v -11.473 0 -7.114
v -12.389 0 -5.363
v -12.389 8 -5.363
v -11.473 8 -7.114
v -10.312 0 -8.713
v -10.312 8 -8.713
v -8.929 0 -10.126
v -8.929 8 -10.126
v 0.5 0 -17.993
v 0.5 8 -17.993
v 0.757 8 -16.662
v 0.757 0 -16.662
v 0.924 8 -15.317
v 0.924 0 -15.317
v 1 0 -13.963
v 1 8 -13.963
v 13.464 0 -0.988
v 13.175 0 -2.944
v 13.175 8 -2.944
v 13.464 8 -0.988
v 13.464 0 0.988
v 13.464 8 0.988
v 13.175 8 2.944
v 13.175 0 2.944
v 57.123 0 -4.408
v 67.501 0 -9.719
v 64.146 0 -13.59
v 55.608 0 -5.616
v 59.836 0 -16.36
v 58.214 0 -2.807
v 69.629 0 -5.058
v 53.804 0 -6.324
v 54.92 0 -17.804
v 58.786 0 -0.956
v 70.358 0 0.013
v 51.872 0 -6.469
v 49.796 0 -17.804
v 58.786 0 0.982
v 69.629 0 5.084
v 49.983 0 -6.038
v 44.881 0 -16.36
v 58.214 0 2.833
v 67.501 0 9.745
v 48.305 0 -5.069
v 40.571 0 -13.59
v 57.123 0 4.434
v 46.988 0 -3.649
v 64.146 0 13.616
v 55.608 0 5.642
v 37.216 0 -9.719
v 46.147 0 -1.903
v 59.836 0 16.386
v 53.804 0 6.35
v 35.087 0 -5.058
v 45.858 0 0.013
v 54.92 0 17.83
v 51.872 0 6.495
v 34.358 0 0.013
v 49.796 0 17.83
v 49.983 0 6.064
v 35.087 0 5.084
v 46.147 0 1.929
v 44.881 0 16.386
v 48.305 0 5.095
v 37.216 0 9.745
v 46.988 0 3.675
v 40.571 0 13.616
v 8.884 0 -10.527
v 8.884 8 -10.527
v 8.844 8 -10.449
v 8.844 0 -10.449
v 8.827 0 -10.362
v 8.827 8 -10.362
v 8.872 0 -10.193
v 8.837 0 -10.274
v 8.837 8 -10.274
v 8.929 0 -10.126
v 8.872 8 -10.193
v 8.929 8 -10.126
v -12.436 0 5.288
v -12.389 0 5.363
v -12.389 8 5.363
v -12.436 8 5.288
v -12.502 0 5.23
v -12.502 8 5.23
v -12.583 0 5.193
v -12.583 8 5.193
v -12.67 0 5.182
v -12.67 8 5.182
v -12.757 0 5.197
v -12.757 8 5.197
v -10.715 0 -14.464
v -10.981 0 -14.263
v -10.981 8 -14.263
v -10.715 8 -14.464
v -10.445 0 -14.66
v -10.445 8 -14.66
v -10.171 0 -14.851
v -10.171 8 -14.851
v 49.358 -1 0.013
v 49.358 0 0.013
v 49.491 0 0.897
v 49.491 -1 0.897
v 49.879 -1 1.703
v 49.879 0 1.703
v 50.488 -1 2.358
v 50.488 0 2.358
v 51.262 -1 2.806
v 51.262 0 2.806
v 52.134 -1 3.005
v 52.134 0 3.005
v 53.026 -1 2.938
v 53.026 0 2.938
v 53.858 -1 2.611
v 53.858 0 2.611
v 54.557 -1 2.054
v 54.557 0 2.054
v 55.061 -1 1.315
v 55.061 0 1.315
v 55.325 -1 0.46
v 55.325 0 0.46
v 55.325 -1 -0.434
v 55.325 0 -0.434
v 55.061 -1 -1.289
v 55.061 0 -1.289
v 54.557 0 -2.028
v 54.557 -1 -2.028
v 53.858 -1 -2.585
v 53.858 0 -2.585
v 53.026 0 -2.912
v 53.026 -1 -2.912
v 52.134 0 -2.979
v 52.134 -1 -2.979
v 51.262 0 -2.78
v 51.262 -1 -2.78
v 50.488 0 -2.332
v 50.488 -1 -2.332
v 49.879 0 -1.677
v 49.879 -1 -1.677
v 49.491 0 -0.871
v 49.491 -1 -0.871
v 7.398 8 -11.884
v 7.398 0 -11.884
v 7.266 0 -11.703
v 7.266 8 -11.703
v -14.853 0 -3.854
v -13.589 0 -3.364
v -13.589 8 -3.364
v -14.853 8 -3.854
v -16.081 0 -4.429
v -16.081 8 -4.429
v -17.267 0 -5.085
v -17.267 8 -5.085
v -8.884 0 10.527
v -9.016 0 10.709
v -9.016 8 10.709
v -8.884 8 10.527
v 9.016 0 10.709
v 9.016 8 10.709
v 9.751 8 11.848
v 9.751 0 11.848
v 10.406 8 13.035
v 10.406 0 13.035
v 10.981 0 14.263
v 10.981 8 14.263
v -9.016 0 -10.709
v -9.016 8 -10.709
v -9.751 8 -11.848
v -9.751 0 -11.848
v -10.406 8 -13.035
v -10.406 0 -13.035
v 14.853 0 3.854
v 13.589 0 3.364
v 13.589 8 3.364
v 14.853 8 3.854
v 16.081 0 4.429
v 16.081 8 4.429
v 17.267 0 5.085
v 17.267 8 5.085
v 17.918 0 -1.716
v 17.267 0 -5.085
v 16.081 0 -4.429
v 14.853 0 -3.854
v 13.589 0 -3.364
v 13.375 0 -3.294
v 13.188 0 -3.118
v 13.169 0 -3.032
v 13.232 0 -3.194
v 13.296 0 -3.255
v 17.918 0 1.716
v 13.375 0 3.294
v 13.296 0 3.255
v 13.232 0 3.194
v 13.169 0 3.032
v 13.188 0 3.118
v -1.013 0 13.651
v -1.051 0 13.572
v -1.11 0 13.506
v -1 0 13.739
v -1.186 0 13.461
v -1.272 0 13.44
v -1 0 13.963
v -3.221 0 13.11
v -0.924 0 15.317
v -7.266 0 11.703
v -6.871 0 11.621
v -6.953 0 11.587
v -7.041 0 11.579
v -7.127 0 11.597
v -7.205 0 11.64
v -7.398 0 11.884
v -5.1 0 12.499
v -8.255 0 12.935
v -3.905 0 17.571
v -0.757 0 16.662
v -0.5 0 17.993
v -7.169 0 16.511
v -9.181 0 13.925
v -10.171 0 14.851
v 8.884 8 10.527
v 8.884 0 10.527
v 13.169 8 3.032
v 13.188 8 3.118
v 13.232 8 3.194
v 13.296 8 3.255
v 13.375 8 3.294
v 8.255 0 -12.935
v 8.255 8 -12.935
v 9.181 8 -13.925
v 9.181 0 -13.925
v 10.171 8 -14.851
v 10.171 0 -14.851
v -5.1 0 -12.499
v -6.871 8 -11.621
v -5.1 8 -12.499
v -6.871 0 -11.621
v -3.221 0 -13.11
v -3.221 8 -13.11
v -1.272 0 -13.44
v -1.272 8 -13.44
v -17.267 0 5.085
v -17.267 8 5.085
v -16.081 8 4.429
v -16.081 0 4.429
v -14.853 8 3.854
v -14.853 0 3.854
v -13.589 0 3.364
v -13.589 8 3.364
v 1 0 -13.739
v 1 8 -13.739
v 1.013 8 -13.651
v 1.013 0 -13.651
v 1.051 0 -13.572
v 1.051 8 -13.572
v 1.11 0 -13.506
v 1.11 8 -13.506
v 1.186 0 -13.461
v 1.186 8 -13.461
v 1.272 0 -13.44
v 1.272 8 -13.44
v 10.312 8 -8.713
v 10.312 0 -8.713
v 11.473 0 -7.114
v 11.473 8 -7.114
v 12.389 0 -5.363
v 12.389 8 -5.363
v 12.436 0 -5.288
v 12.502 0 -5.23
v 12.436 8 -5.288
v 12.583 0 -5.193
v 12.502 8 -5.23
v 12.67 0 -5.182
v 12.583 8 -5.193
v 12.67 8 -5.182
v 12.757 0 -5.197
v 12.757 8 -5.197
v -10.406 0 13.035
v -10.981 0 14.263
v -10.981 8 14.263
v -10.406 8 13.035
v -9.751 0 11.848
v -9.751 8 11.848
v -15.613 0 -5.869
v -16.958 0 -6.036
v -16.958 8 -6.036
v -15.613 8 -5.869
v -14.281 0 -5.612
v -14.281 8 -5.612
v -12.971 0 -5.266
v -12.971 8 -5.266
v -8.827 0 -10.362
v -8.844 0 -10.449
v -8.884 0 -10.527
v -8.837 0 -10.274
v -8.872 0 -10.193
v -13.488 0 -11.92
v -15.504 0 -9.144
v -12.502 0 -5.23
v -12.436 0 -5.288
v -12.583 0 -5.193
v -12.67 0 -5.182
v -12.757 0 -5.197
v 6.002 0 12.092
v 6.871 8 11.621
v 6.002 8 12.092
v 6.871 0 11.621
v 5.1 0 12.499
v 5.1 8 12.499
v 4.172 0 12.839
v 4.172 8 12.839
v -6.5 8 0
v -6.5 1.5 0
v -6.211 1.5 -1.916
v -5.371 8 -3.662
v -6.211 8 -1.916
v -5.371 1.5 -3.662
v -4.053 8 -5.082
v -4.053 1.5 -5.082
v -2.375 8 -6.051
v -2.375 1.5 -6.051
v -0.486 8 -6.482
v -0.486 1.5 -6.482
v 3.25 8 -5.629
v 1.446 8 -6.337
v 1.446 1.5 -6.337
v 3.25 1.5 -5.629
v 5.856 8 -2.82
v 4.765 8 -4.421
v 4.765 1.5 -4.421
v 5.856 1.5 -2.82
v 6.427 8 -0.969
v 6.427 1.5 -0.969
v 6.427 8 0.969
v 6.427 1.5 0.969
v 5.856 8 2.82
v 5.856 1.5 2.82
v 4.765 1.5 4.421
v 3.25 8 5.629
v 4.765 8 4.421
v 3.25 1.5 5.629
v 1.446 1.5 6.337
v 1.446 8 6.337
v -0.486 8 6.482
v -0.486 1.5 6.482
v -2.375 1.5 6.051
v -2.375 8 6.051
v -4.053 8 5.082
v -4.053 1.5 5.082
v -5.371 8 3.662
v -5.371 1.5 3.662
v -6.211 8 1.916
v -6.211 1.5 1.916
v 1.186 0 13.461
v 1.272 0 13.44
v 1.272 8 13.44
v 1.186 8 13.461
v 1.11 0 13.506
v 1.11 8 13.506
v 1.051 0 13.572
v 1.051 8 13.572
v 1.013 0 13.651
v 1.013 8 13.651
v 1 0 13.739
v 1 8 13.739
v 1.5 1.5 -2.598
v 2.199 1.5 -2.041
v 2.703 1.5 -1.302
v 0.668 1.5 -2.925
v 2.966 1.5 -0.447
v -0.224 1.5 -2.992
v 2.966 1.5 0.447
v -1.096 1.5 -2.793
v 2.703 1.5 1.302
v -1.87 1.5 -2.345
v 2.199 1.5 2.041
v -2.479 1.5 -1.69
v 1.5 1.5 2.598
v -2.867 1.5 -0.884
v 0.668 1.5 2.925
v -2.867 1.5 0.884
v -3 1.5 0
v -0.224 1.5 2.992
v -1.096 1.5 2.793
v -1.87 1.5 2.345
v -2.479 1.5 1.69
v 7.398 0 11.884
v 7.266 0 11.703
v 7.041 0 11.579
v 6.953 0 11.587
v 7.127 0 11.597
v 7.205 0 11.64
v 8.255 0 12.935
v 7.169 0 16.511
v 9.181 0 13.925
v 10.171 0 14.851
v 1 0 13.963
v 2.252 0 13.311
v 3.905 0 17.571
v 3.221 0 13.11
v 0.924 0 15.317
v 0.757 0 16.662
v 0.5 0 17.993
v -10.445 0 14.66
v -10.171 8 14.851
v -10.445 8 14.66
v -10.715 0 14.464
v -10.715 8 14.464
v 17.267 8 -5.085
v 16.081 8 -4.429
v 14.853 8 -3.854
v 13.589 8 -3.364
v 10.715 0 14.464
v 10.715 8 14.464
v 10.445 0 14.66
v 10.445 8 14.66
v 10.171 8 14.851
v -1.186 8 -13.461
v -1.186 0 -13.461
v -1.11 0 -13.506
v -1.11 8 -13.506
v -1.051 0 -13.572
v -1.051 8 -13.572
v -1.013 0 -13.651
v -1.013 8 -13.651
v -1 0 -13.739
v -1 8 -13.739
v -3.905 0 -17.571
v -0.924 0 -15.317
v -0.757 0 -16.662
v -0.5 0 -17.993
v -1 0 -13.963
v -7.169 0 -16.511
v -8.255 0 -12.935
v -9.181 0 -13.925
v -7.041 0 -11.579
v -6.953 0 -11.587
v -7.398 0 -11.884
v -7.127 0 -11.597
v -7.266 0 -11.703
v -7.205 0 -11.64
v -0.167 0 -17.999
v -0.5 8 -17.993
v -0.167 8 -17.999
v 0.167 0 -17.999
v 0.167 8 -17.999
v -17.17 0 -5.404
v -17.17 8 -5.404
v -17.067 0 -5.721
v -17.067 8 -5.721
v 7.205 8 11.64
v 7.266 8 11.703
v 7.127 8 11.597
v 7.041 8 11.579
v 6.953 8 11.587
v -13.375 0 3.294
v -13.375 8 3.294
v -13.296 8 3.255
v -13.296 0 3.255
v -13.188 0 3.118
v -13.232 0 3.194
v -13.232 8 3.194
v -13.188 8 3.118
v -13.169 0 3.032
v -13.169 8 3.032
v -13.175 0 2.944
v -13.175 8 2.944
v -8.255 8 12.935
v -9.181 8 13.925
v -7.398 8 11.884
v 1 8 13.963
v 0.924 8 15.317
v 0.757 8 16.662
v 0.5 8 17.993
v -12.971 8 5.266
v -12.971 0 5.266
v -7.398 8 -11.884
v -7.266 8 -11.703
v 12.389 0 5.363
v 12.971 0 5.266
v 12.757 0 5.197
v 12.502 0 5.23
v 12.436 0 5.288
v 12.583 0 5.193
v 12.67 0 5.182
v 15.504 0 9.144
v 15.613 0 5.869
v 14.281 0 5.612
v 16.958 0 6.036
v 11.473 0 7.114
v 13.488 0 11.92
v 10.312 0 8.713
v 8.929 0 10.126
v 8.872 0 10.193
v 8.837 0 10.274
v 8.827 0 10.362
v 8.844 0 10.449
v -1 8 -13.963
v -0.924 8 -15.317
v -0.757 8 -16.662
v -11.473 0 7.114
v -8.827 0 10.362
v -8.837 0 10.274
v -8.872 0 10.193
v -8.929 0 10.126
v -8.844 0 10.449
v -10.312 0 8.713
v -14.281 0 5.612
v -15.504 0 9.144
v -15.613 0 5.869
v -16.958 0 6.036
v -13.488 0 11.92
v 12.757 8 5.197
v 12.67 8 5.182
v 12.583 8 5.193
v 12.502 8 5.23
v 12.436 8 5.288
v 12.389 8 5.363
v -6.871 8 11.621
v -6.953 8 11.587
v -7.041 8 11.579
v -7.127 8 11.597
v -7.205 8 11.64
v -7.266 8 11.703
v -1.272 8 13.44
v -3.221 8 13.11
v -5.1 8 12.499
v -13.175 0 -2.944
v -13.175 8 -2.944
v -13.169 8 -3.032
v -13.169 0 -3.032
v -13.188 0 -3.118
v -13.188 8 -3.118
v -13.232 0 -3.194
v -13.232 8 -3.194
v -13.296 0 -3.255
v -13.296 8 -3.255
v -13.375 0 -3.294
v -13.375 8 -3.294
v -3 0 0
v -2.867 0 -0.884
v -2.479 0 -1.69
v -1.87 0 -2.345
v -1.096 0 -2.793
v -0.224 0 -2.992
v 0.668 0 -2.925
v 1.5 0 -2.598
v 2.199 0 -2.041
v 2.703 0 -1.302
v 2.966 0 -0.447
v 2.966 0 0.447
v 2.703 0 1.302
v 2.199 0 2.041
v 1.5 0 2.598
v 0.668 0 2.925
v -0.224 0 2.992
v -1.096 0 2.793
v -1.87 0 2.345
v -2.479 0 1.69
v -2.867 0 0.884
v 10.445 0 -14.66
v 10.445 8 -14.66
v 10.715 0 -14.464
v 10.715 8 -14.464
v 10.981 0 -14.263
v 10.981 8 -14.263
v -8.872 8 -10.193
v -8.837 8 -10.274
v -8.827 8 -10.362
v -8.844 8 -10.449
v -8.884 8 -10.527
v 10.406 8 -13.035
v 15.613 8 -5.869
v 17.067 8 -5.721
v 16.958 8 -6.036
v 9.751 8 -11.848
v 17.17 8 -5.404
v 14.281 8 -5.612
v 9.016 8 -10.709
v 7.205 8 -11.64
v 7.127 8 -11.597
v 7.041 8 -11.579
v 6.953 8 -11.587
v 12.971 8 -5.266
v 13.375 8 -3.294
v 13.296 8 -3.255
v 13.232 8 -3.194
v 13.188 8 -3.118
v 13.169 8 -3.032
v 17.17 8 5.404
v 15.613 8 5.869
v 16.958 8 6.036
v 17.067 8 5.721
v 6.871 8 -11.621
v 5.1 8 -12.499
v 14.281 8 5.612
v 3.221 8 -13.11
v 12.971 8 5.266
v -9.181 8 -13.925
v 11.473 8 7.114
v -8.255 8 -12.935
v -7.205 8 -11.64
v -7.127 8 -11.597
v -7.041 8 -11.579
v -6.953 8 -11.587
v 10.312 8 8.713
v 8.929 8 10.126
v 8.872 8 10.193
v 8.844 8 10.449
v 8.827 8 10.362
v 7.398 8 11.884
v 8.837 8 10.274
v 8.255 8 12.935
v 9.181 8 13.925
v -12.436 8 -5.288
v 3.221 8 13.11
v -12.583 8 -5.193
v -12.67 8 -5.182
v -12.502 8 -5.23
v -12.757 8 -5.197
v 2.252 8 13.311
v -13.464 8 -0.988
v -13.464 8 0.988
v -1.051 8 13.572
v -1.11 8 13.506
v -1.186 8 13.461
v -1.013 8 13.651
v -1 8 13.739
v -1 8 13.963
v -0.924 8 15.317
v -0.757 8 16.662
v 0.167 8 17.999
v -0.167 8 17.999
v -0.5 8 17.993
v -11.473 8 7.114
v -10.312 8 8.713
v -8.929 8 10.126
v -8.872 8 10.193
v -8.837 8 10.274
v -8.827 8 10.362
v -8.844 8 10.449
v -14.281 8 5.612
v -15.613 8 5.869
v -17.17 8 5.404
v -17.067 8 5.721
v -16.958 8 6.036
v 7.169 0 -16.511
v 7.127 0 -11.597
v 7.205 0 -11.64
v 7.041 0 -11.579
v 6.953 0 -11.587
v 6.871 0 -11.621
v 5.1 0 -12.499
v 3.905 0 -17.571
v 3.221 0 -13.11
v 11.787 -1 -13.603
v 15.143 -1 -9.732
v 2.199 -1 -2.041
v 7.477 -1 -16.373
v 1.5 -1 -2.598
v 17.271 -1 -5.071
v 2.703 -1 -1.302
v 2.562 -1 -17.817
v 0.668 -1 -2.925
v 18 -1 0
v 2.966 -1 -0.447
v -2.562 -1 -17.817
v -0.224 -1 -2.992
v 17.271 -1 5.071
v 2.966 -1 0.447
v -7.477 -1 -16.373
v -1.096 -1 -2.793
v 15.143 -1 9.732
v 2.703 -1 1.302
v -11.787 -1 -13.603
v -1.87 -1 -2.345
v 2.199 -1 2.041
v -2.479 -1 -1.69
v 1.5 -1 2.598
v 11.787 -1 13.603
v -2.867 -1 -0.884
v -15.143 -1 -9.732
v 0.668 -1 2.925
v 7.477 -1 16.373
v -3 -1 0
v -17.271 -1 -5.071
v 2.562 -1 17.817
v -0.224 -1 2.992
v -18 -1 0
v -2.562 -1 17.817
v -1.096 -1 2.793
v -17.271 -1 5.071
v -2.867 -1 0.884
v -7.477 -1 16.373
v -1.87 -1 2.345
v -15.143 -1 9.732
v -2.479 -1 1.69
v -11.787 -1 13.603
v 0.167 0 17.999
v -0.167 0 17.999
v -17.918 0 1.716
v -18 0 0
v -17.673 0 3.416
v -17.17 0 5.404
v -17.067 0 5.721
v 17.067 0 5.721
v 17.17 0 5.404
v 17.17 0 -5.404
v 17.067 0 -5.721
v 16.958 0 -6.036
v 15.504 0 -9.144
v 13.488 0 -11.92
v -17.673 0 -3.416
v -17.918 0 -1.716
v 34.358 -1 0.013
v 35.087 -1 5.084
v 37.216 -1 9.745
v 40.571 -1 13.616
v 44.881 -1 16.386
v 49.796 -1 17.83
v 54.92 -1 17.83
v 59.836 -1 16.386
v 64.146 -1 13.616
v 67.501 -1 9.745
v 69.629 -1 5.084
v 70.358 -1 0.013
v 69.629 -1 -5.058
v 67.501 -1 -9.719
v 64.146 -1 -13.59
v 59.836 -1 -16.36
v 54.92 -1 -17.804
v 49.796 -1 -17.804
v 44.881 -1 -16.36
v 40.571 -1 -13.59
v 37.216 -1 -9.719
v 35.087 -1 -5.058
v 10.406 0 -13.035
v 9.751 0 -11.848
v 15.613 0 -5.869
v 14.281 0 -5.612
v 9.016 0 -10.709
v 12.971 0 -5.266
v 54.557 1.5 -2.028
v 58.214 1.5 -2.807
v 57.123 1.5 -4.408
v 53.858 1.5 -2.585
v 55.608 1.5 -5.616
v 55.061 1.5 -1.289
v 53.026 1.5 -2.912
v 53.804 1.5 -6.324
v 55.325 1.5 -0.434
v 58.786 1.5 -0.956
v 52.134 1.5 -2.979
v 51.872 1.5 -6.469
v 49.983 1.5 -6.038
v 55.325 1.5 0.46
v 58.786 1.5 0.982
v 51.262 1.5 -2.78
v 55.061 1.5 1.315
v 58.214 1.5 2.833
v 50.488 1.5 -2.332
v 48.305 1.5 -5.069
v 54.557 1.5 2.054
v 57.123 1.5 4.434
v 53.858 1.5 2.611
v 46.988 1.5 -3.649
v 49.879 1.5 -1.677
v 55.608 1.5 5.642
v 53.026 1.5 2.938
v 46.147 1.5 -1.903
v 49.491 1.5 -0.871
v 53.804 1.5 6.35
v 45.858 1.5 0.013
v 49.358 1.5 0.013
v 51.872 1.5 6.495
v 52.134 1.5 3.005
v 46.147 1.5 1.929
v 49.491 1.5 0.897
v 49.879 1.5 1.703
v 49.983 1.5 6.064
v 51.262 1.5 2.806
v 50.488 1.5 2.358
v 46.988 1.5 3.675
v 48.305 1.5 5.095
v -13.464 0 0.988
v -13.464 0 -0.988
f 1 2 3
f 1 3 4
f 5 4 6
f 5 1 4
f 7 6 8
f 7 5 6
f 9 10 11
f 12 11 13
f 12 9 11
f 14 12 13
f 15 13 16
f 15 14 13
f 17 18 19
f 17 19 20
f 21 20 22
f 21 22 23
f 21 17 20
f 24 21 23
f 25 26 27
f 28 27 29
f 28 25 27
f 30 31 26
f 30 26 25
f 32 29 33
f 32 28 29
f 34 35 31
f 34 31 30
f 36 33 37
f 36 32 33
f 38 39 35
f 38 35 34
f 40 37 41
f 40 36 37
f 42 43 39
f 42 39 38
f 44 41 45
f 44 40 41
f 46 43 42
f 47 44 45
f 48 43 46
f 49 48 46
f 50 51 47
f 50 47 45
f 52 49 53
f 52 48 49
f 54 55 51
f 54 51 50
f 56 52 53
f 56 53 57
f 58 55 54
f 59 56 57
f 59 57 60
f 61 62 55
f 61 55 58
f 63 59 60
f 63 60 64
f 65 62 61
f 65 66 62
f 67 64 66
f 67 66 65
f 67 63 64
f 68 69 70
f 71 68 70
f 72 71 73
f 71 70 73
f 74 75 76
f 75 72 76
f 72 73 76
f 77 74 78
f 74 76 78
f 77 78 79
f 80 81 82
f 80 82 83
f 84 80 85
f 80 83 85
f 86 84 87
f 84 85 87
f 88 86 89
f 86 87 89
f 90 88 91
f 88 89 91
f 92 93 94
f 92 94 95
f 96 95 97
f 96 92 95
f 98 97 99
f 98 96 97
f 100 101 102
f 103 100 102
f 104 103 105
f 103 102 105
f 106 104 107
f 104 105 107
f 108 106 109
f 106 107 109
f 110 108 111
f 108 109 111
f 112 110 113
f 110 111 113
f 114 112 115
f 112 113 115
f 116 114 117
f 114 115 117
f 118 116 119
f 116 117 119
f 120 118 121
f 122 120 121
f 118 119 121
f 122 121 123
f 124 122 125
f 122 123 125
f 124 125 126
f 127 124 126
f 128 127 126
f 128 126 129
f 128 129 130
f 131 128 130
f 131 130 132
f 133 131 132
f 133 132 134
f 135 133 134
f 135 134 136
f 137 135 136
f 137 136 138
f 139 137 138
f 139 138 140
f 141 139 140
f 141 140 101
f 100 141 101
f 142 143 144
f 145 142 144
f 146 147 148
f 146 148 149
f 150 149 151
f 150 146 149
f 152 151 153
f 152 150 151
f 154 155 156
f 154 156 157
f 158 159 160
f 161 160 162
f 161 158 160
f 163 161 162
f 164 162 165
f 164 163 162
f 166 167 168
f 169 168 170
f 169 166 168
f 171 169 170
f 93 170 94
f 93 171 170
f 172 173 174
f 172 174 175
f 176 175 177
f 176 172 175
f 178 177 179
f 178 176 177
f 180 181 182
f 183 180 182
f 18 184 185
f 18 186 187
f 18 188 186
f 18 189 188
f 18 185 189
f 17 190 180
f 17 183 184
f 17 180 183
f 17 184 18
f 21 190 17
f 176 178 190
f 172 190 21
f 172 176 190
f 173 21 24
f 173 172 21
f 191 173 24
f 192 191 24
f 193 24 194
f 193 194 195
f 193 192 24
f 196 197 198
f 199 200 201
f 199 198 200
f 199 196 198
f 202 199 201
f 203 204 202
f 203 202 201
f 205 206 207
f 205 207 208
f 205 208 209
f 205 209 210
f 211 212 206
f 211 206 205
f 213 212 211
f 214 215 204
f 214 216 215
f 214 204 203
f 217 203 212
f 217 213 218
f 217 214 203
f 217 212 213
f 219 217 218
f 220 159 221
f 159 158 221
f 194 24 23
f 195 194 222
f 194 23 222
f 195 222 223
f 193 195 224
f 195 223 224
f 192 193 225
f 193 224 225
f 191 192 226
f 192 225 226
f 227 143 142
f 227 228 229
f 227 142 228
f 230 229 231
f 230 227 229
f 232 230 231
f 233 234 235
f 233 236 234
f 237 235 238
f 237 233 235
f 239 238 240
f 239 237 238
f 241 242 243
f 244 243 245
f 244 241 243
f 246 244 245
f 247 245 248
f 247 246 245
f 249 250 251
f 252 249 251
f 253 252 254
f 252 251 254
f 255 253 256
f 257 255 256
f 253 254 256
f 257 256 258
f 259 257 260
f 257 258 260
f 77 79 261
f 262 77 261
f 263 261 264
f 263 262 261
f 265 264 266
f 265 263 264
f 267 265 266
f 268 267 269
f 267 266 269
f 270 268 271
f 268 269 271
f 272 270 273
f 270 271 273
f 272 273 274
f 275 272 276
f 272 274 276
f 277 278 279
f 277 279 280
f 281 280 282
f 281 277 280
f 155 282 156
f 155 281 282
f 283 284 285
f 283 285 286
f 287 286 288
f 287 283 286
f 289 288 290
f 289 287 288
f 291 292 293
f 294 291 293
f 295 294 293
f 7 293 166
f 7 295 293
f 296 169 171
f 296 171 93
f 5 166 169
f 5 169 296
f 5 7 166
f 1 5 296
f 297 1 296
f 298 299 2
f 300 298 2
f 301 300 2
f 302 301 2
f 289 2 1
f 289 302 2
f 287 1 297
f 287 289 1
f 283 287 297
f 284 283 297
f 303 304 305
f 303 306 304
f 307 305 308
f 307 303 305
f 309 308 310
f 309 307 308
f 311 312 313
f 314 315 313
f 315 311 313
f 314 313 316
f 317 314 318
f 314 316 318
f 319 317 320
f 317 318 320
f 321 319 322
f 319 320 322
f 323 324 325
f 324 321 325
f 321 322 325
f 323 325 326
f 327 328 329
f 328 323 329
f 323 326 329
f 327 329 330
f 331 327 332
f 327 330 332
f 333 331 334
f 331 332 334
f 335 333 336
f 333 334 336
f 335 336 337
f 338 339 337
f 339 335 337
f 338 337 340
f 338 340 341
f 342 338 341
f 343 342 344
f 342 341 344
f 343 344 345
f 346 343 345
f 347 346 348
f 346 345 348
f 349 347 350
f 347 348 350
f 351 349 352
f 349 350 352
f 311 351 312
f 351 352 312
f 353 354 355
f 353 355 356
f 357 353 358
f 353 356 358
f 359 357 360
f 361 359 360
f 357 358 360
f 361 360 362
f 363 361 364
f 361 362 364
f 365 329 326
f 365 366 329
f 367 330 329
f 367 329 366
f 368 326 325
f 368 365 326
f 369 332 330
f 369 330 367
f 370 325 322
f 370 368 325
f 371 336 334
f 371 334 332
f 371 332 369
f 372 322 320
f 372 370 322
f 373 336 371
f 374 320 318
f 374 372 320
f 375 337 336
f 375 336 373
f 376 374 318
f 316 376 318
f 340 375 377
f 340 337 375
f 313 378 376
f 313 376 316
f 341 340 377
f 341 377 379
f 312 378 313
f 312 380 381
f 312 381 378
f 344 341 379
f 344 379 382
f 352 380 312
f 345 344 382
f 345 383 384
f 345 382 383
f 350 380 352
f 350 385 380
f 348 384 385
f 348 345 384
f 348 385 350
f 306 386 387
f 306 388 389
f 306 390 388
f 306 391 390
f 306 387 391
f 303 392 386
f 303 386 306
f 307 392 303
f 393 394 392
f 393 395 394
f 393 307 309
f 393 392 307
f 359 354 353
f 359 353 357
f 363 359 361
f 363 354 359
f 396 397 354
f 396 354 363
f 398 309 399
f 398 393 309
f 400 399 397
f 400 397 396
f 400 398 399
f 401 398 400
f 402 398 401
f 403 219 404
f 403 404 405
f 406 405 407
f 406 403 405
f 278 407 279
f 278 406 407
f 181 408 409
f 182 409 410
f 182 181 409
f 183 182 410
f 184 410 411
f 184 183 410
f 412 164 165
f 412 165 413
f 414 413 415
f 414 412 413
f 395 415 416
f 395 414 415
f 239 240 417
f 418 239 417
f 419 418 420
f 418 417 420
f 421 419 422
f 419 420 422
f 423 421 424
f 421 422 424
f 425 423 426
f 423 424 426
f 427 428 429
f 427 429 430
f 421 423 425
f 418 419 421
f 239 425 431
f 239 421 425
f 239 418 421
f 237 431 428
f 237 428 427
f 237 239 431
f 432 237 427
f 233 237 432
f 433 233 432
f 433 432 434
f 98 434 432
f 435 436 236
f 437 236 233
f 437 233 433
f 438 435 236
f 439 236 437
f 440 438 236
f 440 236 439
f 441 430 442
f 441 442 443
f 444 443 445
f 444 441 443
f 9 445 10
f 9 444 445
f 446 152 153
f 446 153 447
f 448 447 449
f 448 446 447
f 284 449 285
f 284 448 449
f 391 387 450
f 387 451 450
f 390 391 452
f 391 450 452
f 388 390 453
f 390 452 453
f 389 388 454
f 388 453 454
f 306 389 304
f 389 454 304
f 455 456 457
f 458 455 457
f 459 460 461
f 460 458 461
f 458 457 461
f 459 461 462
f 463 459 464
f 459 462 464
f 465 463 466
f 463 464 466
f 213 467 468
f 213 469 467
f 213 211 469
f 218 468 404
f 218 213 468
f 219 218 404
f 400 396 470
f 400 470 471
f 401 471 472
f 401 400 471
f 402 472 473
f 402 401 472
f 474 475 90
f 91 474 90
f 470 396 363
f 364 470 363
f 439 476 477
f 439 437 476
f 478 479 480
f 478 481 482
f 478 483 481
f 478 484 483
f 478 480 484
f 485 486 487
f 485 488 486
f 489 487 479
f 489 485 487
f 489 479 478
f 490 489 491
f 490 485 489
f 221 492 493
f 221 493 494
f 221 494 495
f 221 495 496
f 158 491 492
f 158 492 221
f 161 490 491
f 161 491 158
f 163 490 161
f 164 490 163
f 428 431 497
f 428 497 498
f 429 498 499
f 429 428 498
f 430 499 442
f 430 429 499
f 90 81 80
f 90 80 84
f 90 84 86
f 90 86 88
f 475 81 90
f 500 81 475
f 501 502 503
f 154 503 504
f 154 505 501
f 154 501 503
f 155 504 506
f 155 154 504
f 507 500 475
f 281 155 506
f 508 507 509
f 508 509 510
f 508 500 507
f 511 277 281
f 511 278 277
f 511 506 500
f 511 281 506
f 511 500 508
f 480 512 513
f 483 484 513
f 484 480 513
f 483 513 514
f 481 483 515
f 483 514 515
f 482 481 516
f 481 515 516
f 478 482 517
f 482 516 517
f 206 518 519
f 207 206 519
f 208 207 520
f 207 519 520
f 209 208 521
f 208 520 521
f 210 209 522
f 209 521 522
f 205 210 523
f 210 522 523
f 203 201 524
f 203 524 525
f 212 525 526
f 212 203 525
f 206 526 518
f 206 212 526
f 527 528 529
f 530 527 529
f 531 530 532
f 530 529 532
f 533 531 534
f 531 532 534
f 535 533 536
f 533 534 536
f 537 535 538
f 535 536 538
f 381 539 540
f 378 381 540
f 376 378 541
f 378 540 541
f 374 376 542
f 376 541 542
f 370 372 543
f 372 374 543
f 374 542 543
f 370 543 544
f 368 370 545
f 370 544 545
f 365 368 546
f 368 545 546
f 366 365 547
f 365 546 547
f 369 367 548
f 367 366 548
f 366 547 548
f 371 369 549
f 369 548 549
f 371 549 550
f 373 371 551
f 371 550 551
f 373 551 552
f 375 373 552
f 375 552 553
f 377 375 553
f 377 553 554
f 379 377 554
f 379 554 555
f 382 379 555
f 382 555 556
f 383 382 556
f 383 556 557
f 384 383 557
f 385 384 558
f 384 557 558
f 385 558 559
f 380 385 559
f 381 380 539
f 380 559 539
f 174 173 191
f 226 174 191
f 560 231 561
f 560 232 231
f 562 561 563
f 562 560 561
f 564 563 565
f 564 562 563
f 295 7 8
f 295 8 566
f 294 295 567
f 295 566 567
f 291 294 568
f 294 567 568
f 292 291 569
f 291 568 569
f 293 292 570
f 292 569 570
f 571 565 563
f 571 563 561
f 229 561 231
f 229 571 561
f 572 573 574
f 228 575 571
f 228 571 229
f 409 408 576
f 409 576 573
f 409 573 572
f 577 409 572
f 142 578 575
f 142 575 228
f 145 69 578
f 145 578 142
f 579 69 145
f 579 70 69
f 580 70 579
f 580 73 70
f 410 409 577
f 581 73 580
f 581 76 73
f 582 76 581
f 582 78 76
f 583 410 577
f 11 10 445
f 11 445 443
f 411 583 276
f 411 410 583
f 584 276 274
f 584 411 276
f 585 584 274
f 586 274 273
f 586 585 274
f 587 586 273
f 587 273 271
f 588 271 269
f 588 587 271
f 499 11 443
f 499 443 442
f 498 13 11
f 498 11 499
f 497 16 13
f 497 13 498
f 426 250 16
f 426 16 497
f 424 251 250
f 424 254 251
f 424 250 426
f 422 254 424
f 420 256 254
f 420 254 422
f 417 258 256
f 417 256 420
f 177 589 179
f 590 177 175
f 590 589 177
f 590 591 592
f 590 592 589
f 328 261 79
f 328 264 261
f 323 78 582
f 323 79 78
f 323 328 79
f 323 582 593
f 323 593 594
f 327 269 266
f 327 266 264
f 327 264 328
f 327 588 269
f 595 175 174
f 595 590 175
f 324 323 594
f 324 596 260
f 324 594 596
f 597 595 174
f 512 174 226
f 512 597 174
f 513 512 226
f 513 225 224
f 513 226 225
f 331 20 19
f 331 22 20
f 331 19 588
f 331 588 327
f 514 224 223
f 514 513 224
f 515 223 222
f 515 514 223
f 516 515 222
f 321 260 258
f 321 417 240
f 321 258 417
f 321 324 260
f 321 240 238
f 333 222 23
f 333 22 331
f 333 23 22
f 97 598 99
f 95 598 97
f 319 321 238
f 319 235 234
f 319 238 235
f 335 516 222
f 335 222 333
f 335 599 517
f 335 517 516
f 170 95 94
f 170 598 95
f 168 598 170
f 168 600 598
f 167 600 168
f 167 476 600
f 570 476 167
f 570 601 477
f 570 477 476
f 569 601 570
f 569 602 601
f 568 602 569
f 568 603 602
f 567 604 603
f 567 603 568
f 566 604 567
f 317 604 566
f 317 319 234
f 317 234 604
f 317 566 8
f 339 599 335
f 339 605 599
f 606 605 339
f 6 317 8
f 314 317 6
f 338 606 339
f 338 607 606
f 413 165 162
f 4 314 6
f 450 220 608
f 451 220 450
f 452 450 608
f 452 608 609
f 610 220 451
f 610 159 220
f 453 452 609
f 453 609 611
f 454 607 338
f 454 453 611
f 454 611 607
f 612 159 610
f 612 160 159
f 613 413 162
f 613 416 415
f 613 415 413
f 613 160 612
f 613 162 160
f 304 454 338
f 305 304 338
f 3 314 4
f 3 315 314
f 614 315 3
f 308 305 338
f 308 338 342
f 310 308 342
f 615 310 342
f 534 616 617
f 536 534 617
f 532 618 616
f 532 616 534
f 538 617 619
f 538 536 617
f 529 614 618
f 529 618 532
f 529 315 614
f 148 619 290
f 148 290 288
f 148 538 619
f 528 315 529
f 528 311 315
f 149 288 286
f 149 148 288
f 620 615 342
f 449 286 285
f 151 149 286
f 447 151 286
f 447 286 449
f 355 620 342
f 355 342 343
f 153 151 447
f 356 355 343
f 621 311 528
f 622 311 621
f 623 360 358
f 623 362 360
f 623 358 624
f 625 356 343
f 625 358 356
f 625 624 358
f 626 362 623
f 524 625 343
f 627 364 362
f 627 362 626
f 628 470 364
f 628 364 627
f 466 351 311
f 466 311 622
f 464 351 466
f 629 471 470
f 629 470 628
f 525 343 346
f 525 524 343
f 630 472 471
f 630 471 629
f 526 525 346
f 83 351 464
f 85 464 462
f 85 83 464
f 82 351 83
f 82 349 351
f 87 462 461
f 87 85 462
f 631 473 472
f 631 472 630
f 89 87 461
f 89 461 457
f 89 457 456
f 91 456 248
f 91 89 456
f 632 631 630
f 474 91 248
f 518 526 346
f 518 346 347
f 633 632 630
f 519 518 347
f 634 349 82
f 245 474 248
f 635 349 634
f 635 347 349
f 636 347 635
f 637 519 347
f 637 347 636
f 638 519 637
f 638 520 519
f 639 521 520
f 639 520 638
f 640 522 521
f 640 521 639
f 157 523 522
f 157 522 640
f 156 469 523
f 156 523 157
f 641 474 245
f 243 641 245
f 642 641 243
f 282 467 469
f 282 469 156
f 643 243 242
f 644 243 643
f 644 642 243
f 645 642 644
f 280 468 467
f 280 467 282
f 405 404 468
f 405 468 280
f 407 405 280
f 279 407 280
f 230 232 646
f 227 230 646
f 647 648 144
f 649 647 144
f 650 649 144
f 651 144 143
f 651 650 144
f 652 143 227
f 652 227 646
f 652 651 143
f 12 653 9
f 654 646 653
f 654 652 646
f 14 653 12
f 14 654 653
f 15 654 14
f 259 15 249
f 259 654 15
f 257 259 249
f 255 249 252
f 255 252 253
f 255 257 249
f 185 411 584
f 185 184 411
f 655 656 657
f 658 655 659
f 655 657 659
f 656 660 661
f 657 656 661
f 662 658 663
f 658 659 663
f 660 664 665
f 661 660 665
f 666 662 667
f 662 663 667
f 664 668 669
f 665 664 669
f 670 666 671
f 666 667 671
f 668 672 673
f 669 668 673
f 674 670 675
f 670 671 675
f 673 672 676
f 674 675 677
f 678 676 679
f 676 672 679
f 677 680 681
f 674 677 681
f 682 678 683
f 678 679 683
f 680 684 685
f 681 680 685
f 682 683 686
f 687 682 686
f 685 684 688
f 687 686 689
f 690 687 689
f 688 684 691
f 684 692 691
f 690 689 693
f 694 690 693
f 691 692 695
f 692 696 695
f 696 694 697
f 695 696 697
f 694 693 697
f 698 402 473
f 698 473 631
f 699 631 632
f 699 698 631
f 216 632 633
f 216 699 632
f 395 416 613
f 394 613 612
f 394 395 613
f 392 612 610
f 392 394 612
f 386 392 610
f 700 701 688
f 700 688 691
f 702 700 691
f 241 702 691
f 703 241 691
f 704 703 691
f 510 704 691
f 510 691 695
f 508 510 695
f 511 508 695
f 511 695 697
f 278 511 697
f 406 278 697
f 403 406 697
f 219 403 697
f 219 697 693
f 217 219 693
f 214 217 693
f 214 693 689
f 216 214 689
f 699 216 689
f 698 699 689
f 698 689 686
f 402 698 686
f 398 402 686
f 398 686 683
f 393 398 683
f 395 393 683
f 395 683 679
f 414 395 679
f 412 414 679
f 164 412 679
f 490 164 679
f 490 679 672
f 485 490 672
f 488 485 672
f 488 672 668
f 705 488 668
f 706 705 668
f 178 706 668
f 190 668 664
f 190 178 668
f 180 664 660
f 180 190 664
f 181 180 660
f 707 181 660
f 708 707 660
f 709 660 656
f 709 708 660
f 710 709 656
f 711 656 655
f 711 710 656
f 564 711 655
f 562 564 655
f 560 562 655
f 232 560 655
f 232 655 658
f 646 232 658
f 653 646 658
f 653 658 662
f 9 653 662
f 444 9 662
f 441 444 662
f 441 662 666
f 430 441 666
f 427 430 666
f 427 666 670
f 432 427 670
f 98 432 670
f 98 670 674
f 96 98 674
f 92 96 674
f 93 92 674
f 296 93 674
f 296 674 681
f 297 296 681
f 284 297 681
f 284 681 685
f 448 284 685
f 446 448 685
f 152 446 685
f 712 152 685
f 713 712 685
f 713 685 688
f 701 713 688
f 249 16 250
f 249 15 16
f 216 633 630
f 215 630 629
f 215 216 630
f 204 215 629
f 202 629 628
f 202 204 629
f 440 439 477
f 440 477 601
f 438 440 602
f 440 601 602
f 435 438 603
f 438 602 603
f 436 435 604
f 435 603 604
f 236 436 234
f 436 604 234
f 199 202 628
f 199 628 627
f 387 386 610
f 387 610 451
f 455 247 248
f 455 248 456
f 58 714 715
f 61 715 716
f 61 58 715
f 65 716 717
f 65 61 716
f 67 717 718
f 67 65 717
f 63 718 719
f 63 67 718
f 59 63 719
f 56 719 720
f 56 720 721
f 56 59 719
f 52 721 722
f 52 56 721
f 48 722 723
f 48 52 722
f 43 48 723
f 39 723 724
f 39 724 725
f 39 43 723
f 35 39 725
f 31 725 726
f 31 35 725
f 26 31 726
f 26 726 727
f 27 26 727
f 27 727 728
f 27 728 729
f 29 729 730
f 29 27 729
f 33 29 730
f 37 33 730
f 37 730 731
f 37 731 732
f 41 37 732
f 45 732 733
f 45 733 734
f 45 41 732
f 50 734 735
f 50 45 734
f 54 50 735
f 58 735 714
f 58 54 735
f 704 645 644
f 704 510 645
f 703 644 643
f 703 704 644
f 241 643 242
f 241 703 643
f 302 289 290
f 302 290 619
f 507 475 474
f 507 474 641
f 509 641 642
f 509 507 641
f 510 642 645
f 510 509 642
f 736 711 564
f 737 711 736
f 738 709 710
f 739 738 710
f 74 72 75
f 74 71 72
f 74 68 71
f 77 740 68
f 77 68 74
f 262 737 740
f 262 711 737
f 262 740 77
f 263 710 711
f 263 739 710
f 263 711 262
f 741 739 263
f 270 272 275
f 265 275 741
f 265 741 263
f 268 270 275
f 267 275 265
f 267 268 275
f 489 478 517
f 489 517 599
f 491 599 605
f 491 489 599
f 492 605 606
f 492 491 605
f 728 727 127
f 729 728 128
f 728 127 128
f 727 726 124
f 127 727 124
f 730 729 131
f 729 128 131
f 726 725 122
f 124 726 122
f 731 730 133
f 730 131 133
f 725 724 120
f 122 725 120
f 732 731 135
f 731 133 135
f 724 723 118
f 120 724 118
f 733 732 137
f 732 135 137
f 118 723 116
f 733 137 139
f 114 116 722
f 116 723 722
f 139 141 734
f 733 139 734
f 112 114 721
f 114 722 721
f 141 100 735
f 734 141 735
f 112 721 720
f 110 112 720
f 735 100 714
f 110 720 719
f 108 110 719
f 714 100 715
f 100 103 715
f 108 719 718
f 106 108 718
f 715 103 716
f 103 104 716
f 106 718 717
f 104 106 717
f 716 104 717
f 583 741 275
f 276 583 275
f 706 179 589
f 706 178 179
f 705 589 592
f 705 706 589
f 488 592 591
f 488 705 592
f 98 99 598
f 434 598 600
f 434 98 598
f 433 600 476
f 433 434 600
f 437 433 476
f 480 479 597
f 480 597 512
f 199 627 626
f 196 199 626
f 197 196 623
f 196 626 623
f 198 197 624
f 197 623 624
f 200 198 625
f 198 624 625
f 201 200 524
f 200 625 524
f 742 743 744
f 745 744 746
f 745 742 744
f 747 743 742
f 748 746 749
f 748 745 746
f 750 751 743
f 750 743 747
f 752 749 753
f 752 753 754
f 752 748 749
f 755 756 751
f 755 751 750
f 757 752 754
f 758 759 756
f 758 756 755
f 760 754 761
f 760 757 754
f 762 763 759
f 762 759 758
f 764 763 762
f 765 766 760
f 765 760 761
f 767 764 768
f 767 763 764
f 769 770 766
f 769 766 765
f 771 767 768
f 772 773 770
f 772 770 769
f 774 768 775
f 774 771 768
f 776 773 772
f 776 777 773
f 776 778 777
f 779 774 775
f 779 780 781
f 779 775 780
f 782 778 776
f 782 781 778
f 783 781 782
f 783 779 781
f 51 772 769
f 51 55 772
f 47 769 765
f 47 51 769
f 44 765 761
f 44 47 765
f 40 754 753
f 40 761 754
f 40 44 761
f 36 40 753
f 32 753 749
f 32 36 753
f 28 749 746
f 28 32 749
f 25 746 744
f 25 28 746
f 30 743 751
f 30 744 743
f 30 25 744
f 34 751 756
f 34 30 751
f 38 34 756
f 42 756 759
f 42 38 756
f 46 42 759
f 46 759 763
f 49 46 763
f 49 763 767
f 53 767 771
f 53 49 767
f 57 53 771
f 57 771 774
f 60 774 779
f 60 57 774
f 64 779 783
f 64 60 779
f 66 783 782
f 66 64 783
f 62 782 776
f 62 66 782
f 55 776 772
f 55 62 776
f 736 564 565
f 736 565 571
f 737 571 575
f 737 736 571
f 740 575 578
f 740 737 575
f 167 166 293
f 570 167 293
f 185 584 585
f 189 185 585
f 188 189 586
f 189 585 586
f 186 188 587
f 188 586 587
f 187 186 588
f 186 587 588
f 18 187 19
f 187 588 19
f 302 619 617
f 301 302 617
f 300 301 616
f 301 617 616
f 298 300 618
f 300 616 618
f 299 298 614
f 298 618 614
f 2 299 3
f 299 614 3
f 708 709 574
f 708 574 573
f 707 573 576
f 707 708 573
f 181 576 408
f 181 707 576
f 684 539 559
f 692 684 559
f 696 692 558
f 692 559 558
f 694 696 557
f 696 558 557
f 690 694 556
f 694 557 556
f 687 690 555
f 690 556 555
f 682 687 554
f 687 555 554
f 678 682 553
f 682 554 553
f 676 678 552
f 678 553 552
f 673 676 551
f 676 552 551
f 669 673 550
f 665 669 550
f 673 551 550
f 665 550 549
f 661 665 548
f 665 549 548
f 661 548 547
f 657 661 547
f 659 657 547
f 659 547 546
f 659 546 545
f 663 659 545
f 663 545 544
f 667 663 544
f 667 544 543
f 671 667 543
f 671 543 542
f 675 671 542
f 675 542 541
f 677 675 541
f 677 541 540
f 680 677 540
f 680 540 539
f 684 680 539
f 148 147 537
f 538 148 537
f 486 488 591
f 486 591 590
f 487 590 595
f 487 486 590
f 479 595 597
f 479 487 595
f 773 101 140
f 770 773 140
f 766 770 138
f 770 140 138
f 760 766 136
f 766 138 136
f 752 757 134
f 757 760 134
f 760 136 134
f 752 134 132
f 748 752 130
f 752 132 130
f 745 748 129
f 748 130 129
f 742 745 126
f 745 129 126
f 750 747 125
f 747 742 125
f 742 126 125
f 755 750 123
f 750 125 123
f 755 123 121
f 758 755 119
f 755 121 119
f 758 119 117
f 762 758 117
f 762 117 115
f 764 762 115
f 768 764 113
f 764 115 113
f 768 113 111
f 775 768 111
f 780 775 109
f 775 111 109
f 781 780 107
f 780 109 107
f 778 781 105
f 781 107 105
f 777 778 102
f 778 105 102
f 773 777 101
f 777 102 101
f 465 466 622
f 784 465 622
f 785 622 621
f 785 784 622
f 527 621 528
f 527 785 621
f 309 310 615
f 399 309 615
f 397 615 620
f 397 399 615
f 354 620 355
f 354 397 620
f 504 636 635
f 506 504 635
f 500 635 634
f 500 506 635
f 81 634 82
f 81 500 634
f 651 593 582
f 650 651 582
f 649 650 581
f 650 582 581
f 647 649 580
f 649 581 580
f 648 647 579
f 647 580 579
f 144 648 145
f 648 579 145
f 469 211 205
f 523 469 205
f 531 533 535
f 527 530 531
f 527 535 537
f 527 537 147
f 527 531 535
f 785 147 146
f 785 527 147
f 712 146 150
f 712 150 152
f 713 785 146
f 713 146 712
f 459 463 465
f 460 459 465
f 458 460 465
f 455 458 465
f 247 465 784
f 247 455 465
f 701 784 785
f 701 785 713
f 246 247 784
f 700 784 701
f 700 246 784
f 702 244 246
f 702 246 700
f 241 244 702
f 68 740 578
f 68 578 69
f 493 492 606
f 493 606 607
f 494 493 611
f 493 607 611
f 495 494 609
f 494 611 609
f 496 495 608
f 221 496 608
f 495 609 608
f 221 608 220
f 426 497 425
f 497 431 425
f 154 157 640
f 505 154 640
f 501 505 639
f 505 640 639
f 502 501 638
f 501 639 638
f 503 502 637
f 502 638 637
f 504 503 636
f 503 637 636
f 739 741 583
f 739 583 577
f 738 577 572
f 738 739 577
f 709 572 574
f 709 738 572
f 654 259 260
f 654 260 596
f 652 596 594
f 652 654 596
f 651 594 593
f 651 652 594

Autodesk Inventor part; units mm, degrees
ref_plane "YZ Plane" through (0, 0, 0) normal (1, 0, 0) x (0, 1, 0)
ref_plane "XZ Plane" through (0, 0, 0) normal (0, 1, 0) x (-1, 0, 0)
ref_plane "XY Plane" through (0, 0, 0) normal (0, 0, 1) x (1, 0, 0)
sketch "Sketch1" plane through (0, 0, 0) normal (0, 1, 0) x (-1, 0, 0)
  circle A0 centre (0, 0) radius 18
  circle A1 centre (0, 0) radius 16.7855
  circle A2 centre (0, 0) radius 13.999
  line L0 (0, -13.999) -> (0, 0) construction
  line L1 (0, 0) -> (13.999, 0) construction
  circle A3 centre (0, 0) radius 13.5
  arc A4 (0.5001, -17.9931) -> (1, -13.9632) centre (-19.096, -13.5161) ccw
  arc A5 (-1, -13.9632) -> (-0.5001, -17.9931) centre (19.096, -13.5161) ccw
  line L2 (-1, -13.9632) -> (-1, -13.4629)
  line L3 (1, -13.9632) -> (1, -13.4629)
  circle A6 centre (0, 0) radius 3
  circle A7 centre (0, 0) radius 6.5
  circle A8 centre (-52.3581, 0.013) radius 18
  circle A9 centre (-52.3581, 0.013) radius 16.7855
  circle A10 centre (-52.3581, 0.013) radius 13.999
  line L4 (-52.3581, -13.986) -> (-52.3581, 0.013) construction
  line L5 (-52.3581, 0.013) -> (-38.3591, 0.013) construction
  circle A11 centre (-52.3581, 0.013) radius 13.5
  arc A12 (-51.858, -17.98) -> (-51.3581, -13.9502) centre (-71.4541, -13.5031) ccw
  arc A13 (-53.3581, -13.9502) -> (-52.8582, -17.98) centre (-33.2621, -13.5031) ccw
  line L6 (-53.3581, -13.9502) -> (-53.3581, -13.4499)
  line L7 (-51.3581, -13.9502) -> (-51.3581, -13.4499)
  circle A14 centre (-52.3581, 0.013) radius 3
  circle A15 centre (-52.3581, 0.013) radius 6.5
  point P0 (0, -16.7855)
  point P1 (0, -16.7855)
  point P2 (0.74, -16.7692)
  point P3 (-0.74, -16.7692)
  point P4 (-0.4999, -17.9931)
  point P5 (-3.765, -17.6018)
  point P6 (0.5138, -17.9927)
  point P7 (-0.5138, -17.9927)
  point P8 (0, -18)
  point P9 (-1, -13.9632)
  point P10 (-0.5001, -17.9931)
  point P11 (1.25, 0)
  point P12 (-52.3581, -16.7725)
  point P13 (-52.3581, -16.7725)
  point P14 (-51.6181, -16.7561)
  point P15 (-53.0981, -16.7561)
  point P16 (-52.858, -17.98)
  point P17 (-56.1231, -17.5888)
  point P18 (-51.8443, -17.9796)
  point P19 (-52.8719, -17.9796)
  point P20 (-52.3581, -17.987)
  point P21 (-53.3581, -13.9502)
  point P22 (-51.1081, 0.013)
  dimension "d0" = 36
  dimension "d1" = 33.571
  dimension "d2" = 27.998
  dimension "d3" = 1.48
  dimension "d4" = 27
  dimension "d13" = 20.101
  dimension "d14" = 1
  dimension "d16" = 1
  dimension "d17" = 4.001
  dimension "d18" = 1.2239
  dimension "d19" = 2.7702
  dimension "d23" = 0.5003
  dimension "d24" = 0.5003
  dimension "d42" = 6
  dimension "d43" = 13
  dimension "d48" = 36
  dimension "d49" = 33.571
  dimension "d50" = 27.998
  dimension "d51" = 1.48
  dimension "d52" = 27
  dimension "d53" = 20.101
  dimension "d54" = 1
  dimension "d55" = 1
  dimension "d56" = 4.001
  dimension "d57" = 1.2239
  dimension "d58" = 2.7702
  dimension "d59" = 0.5003
  dimension "d60" = 0.5003
  dimension "d61" = 6
  dimension "d62" = 13
extrude "Extrusion1" add sketch "Sketch1" along normal blind 8 contours A5 A1 A4 A0 | A5 A2 A4 A1 | L2 A3 L3 A2 | A3 | A6 | A7 picked at (-0.0822, -17.3191) picked at (-0.2901, -15.2142) picked at (0.7779, -13.6407)
fillet "Fillet1" radius 0.3 2 edges at (1, 4, -13.4629) (-1, 4, -13.4629)
pattern_circular "Circular Pattern1" count 10 over 360 about axis through (0, 0, 0) along (0, 1, 0) of "Extrusion1", "Fillet1"
extrude "Extrusion2" cut sketch "Sketch1" along normal blind 8 contours A6
extrude "Extrusion5" cut sketch "Sketch1" along normal blind 8 contours A7
extrude "Extrusion3" add sketch "Sketch1" against normal blind 1 contours A0 A4 A1 A5 | A5 A1 A4 A0 | A5 A2 A4 A1 | A1 A4 A2 A5 | L2 A3 L3 A2 | A2 L3 A3 L2 | A3 | A7 | A8 A12 A9 A13 | A13 A9 A12 A8 | A13 A10 A12 A9 | A9 A12 A10 A13 | L6 A11 L7 A10 | A10 L7 A11 L6 | A11 | A15
extrude "Extrusion6" add sketch "Sketch1" along normal blind 1.5 contours A7 | A15
sketch "Sketch2" plane through (52.3581, 0, 0.013) normal (0, 1, 0) x (1, 0, 0)
  point P0 (-52.3581, 0.013)
properties part number "bearingear10"
